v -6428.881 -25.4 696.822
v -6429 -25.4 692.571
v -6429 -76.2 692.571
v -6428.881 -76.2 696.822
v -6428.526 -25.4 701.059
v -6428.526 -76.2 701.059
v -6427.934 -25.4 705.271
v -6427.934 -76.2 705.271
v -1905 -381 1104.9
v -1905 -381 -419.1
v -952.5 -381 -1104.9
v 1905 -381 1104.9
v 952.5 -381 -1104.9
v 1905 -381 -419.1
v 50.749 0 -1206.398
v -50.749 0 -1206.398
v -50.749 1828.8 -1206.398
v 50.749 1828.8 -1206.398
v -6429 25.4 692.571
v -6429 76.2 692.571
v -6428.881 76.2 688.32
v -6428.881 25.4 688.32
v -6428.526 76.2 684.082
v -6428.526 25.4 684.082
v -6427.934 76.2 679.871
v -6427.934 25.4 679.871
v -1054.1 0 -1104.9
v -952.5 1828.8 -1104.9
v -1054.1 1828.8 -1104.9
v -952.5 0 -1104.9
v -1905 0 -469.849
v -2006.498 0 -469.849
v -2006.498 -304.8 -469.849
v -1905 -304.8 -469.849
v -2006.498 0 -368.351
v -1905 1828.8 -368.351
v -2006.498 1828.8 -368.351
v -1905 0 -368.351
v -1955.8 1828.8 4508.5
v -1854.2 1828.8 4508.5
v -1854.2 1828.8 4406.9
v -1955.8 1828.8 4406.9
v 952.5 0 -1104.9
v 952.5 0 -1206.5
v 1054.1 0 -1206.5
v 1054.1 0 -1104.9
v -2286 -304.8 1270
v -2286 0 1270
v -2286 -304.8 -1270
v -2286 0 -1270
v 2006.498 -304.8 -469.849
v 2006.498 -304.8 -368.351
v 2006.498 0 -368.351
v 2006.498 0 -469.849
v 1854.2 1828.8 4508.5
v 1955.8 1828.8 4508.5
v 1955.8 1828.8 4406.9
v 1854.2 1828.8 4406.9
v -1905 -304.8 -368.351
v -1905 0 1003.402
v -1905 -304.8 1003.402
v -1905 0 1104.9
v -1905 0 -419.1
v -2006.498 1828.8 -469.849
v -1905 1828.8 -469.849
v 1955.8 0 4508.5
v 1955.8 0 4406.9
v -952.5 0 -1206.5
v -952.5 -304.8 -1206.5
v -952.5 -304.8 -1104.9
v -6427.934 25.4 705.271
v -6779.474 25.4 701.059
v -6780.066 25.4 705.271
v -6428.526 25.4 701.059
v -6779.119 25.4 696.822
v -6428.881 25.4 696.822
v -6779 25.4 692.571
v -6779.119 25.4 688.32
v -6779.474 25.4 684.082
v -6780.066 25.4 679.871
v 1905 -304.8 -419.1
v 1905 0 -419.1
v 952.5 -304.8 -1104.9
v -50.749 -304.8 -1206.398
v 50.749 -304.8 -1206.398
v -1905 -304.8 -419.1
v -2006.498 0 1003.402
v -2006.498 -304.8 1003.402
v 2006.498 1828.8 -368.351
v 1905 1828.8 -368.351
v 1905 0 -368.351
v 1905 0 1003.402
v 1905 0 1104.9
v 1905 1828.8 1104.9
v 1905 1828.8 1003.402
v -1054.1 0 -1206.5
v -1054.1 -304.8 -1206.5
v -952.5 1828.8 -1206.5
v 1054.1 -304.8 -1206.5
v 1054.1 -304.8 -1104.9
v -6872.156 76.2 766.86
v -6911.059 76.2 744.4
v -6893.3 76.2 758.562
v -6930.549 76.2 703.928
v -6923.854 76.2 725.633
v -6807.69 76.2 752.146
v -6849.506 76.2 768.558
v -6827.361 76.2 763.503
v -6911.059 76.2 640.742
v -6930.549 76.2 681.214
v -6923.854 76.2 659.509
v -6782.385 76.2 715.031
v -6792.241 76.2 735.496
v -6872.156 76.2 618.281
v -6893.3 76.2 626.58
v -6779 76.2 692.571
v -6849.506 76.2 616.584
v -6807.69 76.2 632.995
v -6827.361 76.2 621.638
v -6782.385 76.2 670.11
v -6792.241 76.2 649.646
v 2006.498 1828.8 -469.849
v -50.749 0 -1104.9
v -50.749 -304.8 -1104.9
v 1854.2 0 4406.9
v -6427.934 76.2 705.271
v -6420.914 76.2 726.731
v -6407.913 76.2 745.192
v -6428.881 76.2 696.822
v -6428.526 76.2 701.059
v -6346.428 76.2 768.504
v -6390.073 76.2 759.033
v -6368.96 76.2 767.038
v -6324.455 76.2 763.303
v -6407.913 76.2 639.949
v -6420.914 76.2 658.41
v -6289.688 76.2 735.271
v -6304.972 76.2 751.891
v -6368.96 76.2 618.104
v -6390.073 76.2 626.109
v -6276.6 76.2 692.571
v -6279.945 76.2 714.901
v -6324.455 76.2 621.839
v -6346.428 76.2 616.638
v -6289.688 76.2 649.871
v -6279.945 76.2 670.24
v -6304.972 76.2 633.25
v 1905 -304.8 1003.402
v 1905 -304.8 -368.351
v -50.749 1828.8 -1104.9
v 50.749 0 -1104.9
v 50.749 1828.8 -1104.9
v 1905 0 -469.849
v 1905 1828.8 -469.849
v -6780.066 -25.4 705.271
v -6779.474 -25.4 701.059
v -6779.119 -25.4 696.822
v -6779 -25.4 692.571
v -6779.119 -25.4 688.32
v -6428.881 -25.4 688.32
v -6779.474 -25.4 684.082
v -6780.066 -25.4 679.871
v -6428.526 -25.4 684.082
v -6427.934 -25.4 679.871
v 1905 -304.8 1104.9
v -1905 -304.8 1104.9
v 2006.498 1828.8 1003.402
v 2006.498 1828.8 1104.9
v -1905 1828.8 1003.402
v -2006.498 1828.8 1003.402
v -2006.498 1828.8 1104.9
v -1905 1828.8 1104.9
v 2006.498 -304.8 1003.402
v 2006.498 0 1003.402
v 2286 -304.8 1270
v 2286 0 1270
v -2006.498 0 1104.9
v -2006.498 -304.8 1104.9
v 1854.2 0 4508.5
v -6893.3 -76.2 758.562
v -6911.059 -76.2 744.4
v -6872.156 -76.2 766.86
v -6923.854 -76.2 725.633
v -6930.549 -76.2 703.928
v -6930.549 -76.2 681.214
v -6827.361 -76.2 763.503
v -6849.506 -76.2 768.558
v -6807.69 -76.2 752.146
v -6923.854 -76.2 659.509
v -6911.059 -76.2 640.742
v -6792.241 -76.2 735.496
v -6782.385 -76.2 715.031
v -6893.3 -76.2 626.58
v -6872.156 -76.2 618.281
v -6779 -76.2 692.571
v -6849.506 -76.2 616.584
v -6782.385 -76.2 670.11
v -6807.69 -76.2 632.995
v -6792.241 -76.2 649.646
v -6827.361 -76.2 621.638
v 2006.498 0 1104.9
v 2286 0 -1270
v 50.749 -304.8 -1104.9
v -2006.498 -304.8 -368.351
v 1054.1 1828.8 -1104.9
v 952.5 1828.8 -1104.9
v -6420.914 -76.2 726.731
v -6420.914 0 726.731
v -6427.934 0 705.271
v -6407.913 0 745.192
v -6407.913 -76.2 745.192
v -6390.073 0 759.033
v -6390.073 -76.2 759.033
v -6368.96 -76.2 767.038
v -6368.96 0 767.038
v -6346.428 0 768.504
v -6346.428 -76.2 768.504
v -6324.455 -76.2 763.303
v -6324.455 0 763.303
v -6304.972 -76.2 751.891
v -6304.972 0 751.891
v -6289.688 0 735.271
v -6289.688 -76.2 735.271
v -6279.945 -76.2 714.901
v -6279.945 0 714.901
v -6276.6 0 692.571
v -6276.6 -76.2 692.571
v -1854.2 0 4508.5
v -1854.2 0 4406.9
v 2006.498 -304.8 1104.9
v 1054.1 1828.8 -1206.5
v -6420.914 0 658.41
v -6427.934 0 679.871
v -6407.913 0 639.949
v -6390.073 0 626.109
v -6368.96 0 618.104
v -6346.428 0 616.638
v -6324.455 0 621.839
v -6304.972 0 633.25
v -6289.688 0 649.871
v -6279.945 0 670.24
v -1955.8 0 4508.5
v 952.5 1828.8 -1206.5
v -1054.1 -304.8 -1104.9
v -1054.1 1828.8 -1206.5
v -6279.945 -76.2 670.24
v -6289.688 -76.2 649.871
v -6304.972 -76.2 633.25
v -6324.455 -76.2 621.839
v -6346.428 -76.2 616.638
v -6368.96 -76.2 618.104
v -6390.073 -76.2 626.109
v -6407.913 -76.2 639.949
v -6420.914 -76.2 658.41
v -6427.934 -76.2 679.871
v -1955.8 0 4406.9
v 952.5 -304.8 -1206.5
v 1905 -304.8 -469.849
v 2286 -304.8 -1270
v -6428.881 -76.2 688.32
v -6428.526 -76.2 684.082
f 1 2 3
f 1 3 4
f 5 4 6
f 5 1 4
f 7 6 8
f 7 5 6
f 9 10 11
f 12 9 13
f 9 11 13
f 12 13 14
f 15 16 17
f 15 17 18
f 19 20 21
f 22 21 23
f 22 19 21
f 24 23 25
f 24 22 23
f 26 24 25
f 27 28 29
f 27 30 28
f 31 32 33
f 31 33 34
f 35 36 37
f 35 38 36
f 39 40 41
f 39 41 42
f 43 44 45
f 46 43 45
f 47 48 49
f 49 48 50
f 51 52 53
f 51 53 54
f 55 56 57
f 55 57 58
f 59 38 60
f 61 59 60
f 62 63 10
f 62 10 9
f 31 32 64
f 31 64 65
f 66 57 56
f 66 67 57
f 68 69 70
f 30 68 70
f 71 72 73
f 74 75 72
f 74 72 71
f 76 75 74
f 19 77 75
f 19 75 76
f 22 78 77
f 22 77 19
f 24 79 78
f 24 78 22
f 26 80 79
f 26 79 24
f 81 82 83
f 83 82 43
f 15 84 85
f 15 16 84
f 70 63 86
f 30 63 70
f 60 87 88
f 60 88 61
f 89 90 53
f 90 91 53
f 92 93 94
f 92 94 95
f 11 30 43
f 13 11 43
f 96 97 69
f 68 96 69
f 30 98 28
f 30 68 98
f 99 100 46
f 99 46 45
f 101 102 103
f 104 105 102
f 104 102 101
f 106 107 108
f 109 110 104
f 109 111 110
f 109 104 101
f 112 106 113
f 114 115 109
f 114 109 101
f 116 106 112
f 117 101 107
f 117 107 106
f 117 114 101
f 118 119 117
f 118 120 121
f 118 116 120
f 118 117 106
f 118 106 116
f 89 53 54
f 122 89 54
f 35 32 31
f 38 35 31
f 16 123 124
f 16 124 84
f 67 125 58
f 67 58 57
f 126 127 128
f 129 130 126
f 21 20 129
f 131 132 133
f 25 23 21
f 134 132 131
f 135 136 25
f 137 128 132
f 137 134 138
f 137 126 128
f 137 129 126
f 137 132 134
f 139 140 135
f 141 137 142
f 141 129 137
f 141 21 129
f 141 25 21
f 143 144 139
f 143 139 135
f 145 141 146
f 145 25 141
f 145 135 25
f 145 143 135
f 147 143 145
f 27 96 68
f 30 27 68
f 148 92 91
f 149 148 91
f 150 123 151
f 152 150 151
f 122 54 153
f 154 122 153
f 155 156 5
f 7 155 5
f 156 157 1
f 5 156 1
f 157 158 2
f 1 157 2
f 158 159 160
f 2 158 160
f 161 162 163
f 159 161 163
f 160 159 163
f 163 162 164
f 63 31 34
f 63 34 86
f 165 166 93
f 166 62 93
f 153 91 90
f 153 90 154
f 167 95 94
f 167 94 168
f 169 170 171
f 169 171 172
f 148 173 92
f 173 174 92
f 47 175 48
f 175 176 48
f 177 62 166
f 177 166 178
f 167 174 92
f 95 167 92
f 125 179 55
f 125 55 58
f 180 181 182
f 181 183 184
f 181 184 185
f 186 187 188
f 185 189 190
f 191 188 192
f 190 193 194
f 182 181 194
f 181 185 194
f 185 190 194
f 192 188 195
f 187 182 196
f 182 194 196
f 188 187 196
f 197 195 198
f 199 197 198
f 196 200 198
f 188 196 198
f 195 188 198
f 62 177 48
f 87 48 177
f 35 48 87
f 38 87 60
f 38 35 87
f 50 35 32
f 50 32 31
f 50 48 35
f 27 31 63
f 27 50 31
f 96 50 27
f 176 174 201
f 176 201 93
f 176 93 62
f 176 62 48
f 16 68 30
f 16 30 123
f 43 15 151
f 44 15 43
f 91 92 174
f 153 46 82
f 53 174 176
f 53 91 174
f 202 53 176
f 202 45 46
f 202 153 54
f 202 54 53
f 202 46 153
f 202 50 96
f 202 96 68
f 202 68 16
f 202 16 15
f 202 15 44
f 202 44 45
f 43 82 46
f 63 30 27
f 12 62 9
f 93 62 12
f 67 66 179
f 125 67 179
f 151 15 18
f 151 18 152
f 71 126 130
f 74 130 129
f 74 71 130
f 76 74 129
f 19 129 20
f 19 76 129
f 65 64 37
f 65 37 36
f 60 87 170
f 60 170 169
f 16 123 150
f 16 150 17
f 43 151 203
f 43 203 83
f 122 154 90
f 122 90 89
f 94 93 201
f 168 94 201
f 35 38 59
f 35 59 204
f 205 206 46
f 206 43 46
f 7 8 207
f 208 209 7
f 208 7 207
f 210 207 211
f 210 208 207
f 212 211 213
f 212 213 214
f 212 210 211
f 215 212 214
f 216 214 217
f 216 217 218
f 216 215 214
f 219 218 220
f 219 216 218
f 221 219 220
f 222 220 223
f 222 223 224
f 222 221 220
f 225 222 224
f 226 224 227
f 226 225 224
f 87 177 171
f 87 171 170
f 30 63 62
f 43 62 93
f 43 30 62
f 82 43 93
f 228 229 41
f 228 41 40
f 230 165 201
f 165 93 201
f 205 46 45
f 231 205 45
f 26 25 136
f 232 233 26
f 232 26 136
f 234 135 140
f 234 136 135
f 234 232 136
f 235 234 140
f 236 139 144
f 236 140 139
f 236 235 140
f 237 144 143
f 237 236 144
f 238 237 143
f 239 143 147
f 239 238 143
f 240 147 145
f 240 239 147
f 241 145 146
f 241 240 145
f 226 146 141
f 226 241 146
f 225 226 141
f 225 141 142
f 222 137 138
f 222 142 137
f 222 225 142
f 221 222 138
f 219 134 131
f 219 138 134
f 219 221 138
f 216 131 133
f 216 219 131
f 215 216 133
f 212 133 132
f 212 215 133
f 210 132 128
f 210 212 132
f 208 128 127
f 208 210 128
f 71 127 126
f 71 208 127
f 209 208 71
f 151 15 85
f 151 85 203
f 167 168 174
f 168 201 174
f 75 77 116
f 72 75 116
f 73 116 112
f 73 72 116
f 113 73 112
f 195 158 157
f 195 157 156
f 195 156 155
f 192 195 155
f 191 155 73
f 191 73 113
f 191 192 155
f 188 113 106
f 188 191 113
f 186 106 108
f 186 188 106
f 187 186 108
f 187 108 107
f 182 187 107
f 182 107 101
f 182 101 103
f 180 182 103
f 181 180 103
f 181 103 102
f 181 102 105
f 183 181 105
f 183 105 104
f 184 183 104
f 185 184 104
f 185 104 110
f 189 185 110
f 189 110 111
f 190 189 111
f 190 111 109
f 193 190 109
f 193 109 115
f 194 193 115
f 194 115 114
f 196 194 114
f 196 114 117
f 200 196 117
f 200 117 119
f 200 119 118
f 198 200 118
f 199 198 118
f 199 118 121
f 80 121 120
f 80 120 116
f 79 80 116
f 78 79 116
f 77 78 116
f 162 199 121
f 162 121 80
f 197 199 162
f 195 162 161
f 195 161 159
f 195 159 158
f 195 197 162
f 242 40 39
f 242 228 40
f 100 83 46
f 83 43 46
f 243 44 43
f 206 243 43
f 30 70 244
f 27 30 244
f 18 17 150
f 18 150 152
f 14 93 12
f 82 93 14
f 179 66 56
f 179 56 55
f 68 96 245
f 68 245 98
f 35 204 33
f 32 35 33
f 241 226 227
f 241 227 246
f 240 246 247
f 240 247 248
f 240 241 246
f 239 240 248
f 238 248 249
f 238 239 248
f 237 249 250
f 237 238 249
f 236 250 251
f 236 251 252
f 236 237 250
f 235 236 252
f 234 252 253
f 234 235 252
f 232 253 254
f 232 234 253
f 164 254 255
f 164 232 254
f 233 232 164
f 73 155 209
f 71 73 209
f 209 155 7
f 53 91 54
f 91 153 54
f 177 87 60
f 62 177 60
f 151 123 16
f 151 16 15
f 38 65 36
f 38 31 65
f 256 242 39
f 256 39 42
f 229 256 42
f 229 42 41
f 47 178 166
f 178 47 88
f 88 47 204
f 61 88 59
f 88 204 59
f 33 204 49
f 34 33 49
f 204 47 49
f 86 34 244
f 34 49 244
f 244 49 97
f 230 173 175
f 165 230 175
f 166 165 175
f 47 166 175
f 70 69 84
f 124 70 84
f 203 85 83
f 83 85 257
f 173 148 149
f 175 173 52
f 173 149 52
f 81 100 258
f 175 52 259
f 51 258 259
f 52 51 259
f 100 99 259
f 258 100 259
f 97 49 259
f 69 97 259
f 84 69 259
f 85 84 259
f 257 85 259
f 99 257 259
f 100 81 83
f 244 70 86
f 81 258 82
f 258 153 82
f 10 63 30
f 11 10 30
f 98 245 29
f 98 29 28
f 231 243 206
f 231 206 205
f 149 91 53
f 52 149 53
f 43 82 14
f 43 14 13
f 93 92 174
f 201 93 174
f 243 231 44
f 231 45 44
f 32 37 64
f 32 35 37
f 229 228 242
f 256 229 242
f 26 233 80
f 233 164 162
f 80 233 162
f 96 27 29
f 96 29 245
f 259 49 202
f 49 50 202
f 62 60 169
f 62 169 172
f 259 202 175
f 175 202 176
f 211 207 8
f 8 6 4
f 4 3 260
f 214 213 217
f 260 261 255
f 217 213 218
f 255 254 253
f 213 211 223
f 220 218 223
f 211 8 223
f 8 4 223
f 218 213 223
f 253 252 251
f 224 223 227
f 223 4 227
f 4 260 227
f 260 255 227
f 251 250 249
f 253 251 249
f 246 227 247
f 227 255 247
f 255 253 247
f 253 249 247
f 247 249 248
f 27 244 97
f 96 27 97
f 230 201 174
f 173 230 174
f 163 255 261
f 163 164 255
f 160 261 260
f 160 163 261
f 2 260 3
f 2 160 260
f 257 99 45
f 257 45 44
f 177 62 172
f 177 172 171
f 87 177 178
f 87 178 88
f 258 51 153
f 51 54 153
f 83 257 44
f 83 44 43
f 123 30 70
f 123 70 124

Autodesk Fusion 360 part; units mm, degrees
sketch "Sketch1" plane through (0, 0, 0) normal (0, 1, 0) x (1, 0, 0)
  line L0 (0, 1104.9) -> (0, -342.9) construction
  line L1 (-1905, 1104.9) -> (1905, 1104.9) construction
  line L2 (-1905, -1104.9) -> (1905, -1104.9)
  line L3 (1905, -1104.9) -> (-1905, 1104.9) construction
  line L4 (-1905, -1104.9) -> (-1905, 1104.9) construction
  line L5 (0, -342.9) -> (0, 419.1) construction
  line L6 (0, 1104.9) -> (0, -342.9) construction
  line L7 (-1905, 419.1) -> (-952.5, 1104.9)
  line L8 (-1905, -342.9) -> (-1905, 1104.9) construction
  line L9 (-1905, 419.1) -> (-1905, -1104.9)
  line L10 (1905, 1104.9) -> (1905, -1104.9) construction
  line L11 (-1905, 1104.9) -> (0, 1104.9) construction
  line L12 (1905, -342.9) -> (1905, 1104.9) construction
  line L13 (1905, -342.9) -> (1905, 419.1) construction
  line L14 (0, -342.9) -> (1905, -342.9) construction
  line L15 (1905, 1104.9) -> (0, 1104.9) construction
  line L16 (1905, 419.1) -> (952.5, 1104.9) construction
  line L17 (-952.5, 1104.9) -> (952.5, 1104.9)
  line L18 (0, 1104.9) -> (0, -342.9) construction
  line L19 (1905, 419.1) -> (-1905, 419.1)
  line L20 (1905, -1104.9) -> (1905, 419.1)
  line L21 (-1905, -1104.9) -> (1905, 1104.9) construction
  line L22 (1905, -1104.9) -> (-1905, -1104.9) construction
  line L23 (0, -342.9) -> (-1905, -342.9) construction
  line L24 (1905, 419.1) -> (952.5, 1104.9)
  line L25 (1905, 419.1) -> (0, 419.1) construction
  line L26 (50.7492, 1206.3984) -> (50.7492, 1104.9)
  line L27 (952.5, 1104.9) -> (-952.5, 1104.9)
  line L28 (-1905, -1104.9) -> (1905, -1104.9)
  line L29 (-1905, -1104.9) -> (-2006.4984, -1104.9)
  line L30 (-2006.4984, 368.3508) -> (-2006.4984, 469.8492)
  line L31 (-1905, -1003.4016) -> (-1905, -1104.9)
  line L32 (952.5, 1104.9) -> (1054.1, 1104.9)
  line L33 (1054.1, 1206.5) -> (952.5, 1206.5)
  line L34 (1905, 419.1) -> (952.5, 1104.9)
  line L35 (0, 1104.9) -> (0, -1104.9) construction
  line L36 (1905, -1104.9) -> (2006.4984, -1104.9)
  line L37 (-1905, 368.3508) -> (-2006.4984, 469.8492) construction
  line L38 (-952.5, 1206.5) -> (-952.5, 1104.9)
  line L39 (50.7492, 1104.9) -> (-50.7492, 1206.3984) construction
  line L40 (-1905, 419.1) -> (-1955.7492, 419.1) construction
  line L41 (2006.4984, 368.3508) -> (1905, 469.8492) construction
  line L42 (0, 1104.9) -> (0, 1155.6492) construction
  line L43 (-1905, 419.1) -> (-1905, -1104.9)
  line L44 (-50.7492, 1104.9) -> (50.7492, 1206.3984) construction
  line L45 (-2006.4984, 469.8492) -> (-1905, 469.8492)
  line L46 (-50.7492, 1206.3984) -> (50.7492, 1206.3984)
  line L47 (-2006.4984, -1104.9) -> (-2006.4984, -1003.4016)
  line L48 (1905, -1003.4016) -> (1905, -1104.9)
  line L49 (-952.5, 1104.9) -> (-1905, 419.1)
  line L50 (-50.7492, 1104.9) -> (-50.7492, 1206.3984)
  line L51 (2006.4984, -1003.4016) -> (1905, -1003.4016)
  line L52 (-2006.4984, -1003.4016) -> (-1905, -1003.4016)
  line L53 (50.7492, 1104.9) -> (-50.7492, 1104.9)
  line L54 (1054.1, 1104.9) -> (1054.1, 1206.5)
  line L55 (-1905, 368.3508) -> (-2006.4984, 368.3508)
  line L56 (-1054.1, 1206.5) -> (-952.5, 1206.5)
  line L57 (2006.4984, -1104.9) -> (2006.4984, -1003.4016)
  line L58 (1905, 368.3508) -> (2006.4984, 469.8492) construction
  line L59 (-1054.1, 1104.9) -> (-1054.1, 1206.5)
  line L60 (1905, 419.1) -> (1955.7492, 419.1) construction
  line L61 (-1905, 469.8492) -> (-1905, 368.3508)
  line L62 (2006.4984, 469.8492) -> (1905, 469.8492)
  line L63 (1905, 469.8492) -> (1905, 368.3508)
  line L64 (-2006.4984, 368.3508) -> (-1905, 469.8492) construction
  line L65 (1905, 368.3508) -> (2006.4984, 368.3508)
  line L66 (-952.5, 1104.9) -> (-1054.1, 1104.9)
  line L67 (2006.4984, 368.3508) -> (2006.4984, 469.8492)
  line L68 (952.5, 1206.5) -> (952.5, 1104.9)
  line L69 (1905, -1104.9) -> (1905, 419.1)
  line L70 (2286, -1270) -> (-2286, -1270)
  line L71 (-2286, -1270) -> (-2286, 1270)
  line L72 (-2286, 1270) -> (2286, 1270)
  line L73 (2286, 1270) -> (2286, -1270)
  line L74 (2286, -1270) -> (-2286, 1270) construction
  line L75 (-2286, -1270) -> (2286, 1270) construction
  point P0 (-1955.7492, 419.1)
  point P1 (0, 1155.6492)
  point P2 (952.5, 1104.9)
  point P3 (1905, 419.1)
  point P4 (1905, -1104.9)
  point P5 (1955.7492, 419.1)
  dimension "d1" = 3810
  dimension "d2" = 2209.8
  dimension "d3" = 1447.8
  dimension "d4" = 762
  dimension "d5" = 762
  dimension "d8" = 101.6
  dimension "d9" = 101.6
  dimension "d10" = 50.7492
  dimension "d11" = 101.4984
  dimension "d12" = 101.4984
  dimension "d13" = 50.7492
  dimension "d14" = 101.4984
  dimension "d15" = 101.4984
  dimension "d16" = 101.4984
  dimension "d17" = 101.4984
extrude "Extrude1" add sketch "Sketch1" along normal blind 1828.8 contours L9 L29 L31 L43 L47 L52 | L38 L56 L59 L66 | L32 L33 L54 L68 | L20 L36 L48 L51 L57 L69 | L9 L30 L43 L45 L55 L61 | L20 L62 L63 L65 L67 L69 | L17 L26 L27 L46 L50 L53 makes body 1 at (952.5, 609.6, -1172.6333) makes body 2 at (-986.3667, 609.6, -1104.9) makes body 3 at (-50.7492, 609.6, -1138.7328) makes body 4 at (1972.6656, 609.6, -469.8492) makes body 5 at (-1938.8328, 609.6, -368.3508) makes body 6 at (-1938.8328, 609.6, 1104.9) makes body 7 at (1905, 1219.2, 1071.0672)
extrude "Extrude2" add sketch "Sketch1" against normal blind 304.8 separate body makes body 8
extrude "Extrude3" add sketch "Sketch1" against normal blind 381 separate body contours L2 L9 L19 L20 L28 L31 L43 L48 L61 L63 L69 | L7 L17 L19 L24 L27 L34 L49 L53 makes body 9
ref_plane "WorkPlane1" through (0, 1828.8, 0) normal (0, 1, 0) x (0, 0, 1)
sketch "Sketch3" plane through (0, 1828.8, 0) normal (0, 1, 0) x (1, 0, 0)
  line L0 (-1905, 419.1) -> (-1905, -1104.9) construction
  line L1 (0, 1104.9) -> (0, -1104.9) construction
  line L2 (1905, -1104.9) -> (1905, 419.1) construction
  line L3 (952.5, 1104.9) -> (-952.5, 1104.9) construction
  line L4 (-1115.3442, 97.5223) -> (-1828.8, -4457.6999)
  line L5 (-1905, -1104.9) -> (1905, -1104.9) construction
  line L6 (831.349, -64.1091) -> (1469.5957, -4515.3092)
  line L7 (1905, 419.1) -> (952.5, 1104.9) construction
  line L8 (-952.5, 1104.9) -> (-1905, 419.1) construction
  line L9 (50.7492, 1104.9) -> (50.7492, 1206.3984)
  line L10 (50.7492, 1206.3984) -> (-50.7492, 1206.3984)
  line L11 (-50.7492, 1206.3984) -> (-50.7492, 1104.9)
  line L12 (-50.7492, 1104.9) -> (50.7492, 1104.9)
  line L13 (-1905, 469.8492) -> (-2006.4984, 469.8492)
  line L14 (-2006.4984, 469.8492) -> (-2006.4984, 368.3508)
  line L15 (-2006.4984, 368.3508) -> (-1905, 368.3508)
  line L16 (-1905, 368.3508) -> (-1905, 469.8492)
  line L17 (1905, 368.3508) -> (2006.4984, 368.3508)
  line L18 (2006.4984, 368.3508) -> (2006.4984, 469.8492)
  line L19 (2006.4984, 469.8492) -> (1905, 469.8492)
  line L20 (1905, 469.8492) -> (1905, 368.3508)
  line L21 (831.349, -64.1091) -> (820.5335, 11.3194) construction
  circle A0 centre (825.9413, -26.3949) radius 38.1
  line L22 (-1115.3442, 97.5223) -> (-1115.3442, 173.7223) construction
  circle A1 centre (-1115.3442, 135.6223) radius 38.1
  line L23 (-1153.3891, 137.6712) -> (-1905, 368.3508)
  line L24 (-1115.3442, 173.7223) -> (-50.7492, 1104.9)
  line L25 (812.5209, 9.2633) -> (50.7492, 1104.9)
  line L26 (788.4457, -33.1542) -> (1905, 368.3508)
  point P0 (0, 419.1)
  dimension "d37" = 76.2
  dimension "d38" = 76.2
ref_plane "WorkPlane3" through (0, 1524, 0) normal (0, 1, 0) x (0, 0, 1)
sketch "Sketch4" plane through (0, 1524, 0) normal (0, 1, 0) x (1, 0, 0)
  line L0 (0, 1143) -> (0, -1778) construction
  line L1 (0, -1778) -> (0, 0) construction
  line L2 (175, -876.3) -> (-175, -876.3)
  line L3 (-175, -876.3) -> (-175, -901.7)
  line L4 (-175, -901.7) -> (175, -901.7)
  line L5 (175, -901.7) -> (175, -876.3)
  line L6 (175, -876.3) -> (-175, -901.7) construction
  line L7 (-175, -876.3) -> (175, -901.7) construction
  line L8 (-175, -889) -> (-251.2, -889) construction
  line L9 (175, -889) -> (251.2, -889) construction
  circle A0 centre (251.2, -889) radius 76.2
  circle A1 centre (-251.2, -889) radius 76.2
  line L10 (-1828.8, -4457.6999) -> (-256.5809, -965.0098)
  line L11 (-952.5, 1104.9) -> (-952.5, 1206.5)
  line L12 (-952.5, 1206.5) -> (-1054.1, 1206.5)
  line L13 (-1054.1, 1206.5) -> (-1054.1, 1104.9)
  line L14 (-1054.1, 1104.9) -> (-952.5, 1104.9)
  line L15 (952.5, 1206.5) -> (952.5, 1104.9)
  line L16 (952.5, 1104.9) -> (1054.1, 1104.9)
  line L17 (1054.1, 1104.9) -> (1054.1, 1206.5)
  line L18 (1054.1, 1206.5) -> (952.5, 1206.5)
  line L19 (-256.5809, -965.0098) -> (-256.5809, -812.9902) construction
  line L20 (255.2053, -965.0946) -> (255.2053, -812.9053) construction
  line L21 (-952.5, 1104.9) -> (-256.5809, -812.9902)
  line L22 (952.5, 1104.9) -> (255.2053, -812.9053)
  line L23 (255.2053, -965.0946) -> (1469.5957, -4515.3092)
  line L24 (-175, -901.7) -> (-176.0658, -901.7)
  line L25 (-175, -876.3) -> (-176.0658, -876.3)
  line L26 (175, -876.3) -> (176.0658, -876.3)
  line L27 (175, -901.7) -> (176.0658, -901.7)
  point P0 (0, -889)
  point P1 (-1828.8, -4457.6999)
  point P2 (1469.5957, -4515.3092)
  dimension "d27" = 350
  dimension "d28" = 25.4
  dimension "d29" = 76.2
  dimension "d30" = 76.2
sketch "Sketch5" plane through (0, 0, 0) normal (0, 1, 0) x (-1, 0, 0)
  line L0 (-1054.1, -1104.9) -> (-952.5, -1104.9)
  line L1 (-952.5, -1104.9) -> (-1905, -419.1)
  line L2 (-1905, -419.1) -> (-1905, -469.8492)
  line L3 (-1905, -469.8492) -> (-2006.4984, -469.8492)
  line L4 (-2006.4984, -469.8492) -> (-2006.4984, -368.3508)
  line L5 (-2006.4984, -368.3508) -> (-1905, -368.3508)
  line L6 (-1905, -368.3508) -> (-1905, 1003.4016)
  line L7 (-1905, 1003.4016) -> (-2006.4984, 1003.4016)
  line L8 (-2006.4984, 1003.4016) -> (-2006.4984, 1104.9)
  line L9 (-2006.4984, 1104.9) -> (2006.4984, 1104.9)
  line L10 (2006.4984, 1104.9) -> (2006.4984, 1003.4016)
  line L11 (2006.4984, 1003.4016) -> (1905, 1003.4016)
  line L12 (1905, 1003.4016) -> (1905, -368.3508)
  line L13 (1905, -368.3508) -> (2006.4984, -368.3508)
  line L14 (2006.4984, -368.3508) -> (2006.4984, -469.8492)
  line L15 (2006.4984, -469.8492) -> (1905, -469.8492)
  line L16 (1905, -469.8492) -> (1905, -419.1)
  line L17 (1905, -419.1) -> (952.5, -1104.9)
  line L18 (952.5, -1104.9) -> (1054.1, -1104.9)
  line L19 (1054.1, -1104.9) -> (1054.1, -1206.5)
  line L20 (1054.1, -1206.5) -> (952.5, -1206.5)
  line L21 (952.5, -1206.5) -> (952.5, -1104.9)
  line L22 (952.5, -1104.9) -> (50.7492, -1104.9)
  line L23 (50.7492, -1104.9) -> (50.7492, -1206.3984)
  line L24 (50.7492, -1206.3984) -> (-50.7492, -1206.3984)
  line L25 (-50.7492, -1206.3984) -> (-50.7492, -1104.9)
  line L26 (-50.7492, -1104.9) -> (-952.5, -1104.9)
  line L27 (-952.5, -1104.9) -> (-952.5, -1206.5)
  line L28 (-952.5, -1206.5) -> (-1054.1, -1206.5)
  line L29 (-1054.1, -1206.5) -> (-1054.1, -1104.9)
  line L30 (-2286, -1270) -> (2286, -1270)
  line L31 (2286, -1270) -> (2286, 1270)
  line L32 (2286, 1270) -> (-2286, 1270)
  line L33 (-2286, 1270) -> (-2286, -1270)
  line L34 (1905, 1104.9) -> (1905, 4457.6999) construction
  line L35 (-1905, 1104.9) -> (-1905, 4457.6999) construction
  line L36 (-1905, 4457.6999) -> (1905, 4457.6999) construction
  line L37 (1854.2, 4508.4999) -> (1955.8, 4508.4999)
  line L38 (1955.8, 4508.4999) -> (1955.8, 4406.8999)
  line L39 (1955.8, 4406.8999) -> (1854.2, 4406.8999)
  line L40 (1854.2, 4406.8999) -> (1854.2, 4508.4999)
  line L41 (1854.2, 4508.4999) -> (1955.8, 4406.8999) construction
  line L42 (1955.8, 4508.4999) -> (1854.2, 4406.8999) construction
  line L43 (-1955.8, 4508.4999) -> (-1854.2, 4508.4999)
  line L44 (-1854.2, 4508.4999) -> (-1854.2, 4406.8999)
  line L45 (-1854.2, 4406.8999) -> (-1955.8, 4406.8999)
  line L46 (-1955.8, 4406.8999) -> (-1955.8, 4508.4999)
  line L47 (-1955.8, 4508.4999) -> (-1854.2, 4406.8999) construction
  line L48 (-1854.2, 4508.4999) -> (-1955.8, 4406.8999) construction
  point P0 (1828.8, 4457.6999)
  point P1 (-1469.5957, 4515.3092)
  point P2 (1905, 4457.6999)
  point P3 (-1905, 4457.6999)
  dimension "d31" = 101.6
  dimension "d32" = 101.6
  dimension "d33" = 101.6
  dimension "d34" = 101.6
extrude "Extrude4" add sketch "Sketch5" along normal blind 1828.8 separate body contours L37 L38 L39 L40 | L43 L44 L45 L46 makes body 10 at (-1888.0667, 609.6, 4508.4999) makes body 11 at (1921.9333, 609.6, 4508.4999)
sketch "Sketch6" plane through (0, 0, 0) normal (0, 1, 0) x (1, 0, 0)
  line L0 (-6779, -705.2707) -> (-6780.0658, -705.2707)
  line L1 (-6429, -679.8707) -> (-6427.9342, -679.8707)
  line L2 (-6779, -679.8707) -> (-6429, -705.2707) construction
  circle A0 centre (-6855.2, -692.5707) radius 76.2
  line L3 (-6779, -705.2707) -> (-6429, -705.2707)
  line L4 (-6855.2, -768.7707) -> (-6855.2, -616.3707) construction
  circle A1 centre (-6352.8, -692.5707) radius 76.2
  line L5 (-6779, -679.8707) -> (-6780.0658, -679.8707)
  line L6 (-6429, -705.2707) -> (-6427.9342, -705.2707)
  line L7 (-6429, -705.2707) -> (-6429, -679.8707)
  line L8 (-6352.8, -768.7707) -> (-6352.8, -616.3707) construction
  line L9 (-6779, -692.5707) -> (-6855.2, -692.5707) construction
  line L10 (-6429, -679.8707) -> (-6779, -679.8707)
  line L11 (-6429, -692.5707) -> (-6352.8, -692.5707) construction
  line L12 (-6779, -679.8707) -> (-6779, -705.2707)
  line L13 (-6429, -679.8707) -> (-6779, -705.2707) construction
  point P0 (-6604, -692.5707)
  dimension "d39" = 350
  dimension "d40" = 25.4
  dimension "d41" = 76.2
  dimension "d42" = 76.2
extrude "Extrude5" add sketch "Sketch6" along normal mid plane 152.4 separate body contours A0 | A1 makes body 12 at (-6868.432, -25.4, 767.6131) makes body 13 at (-6331.4073, 76.2, 674.1041)
extrude "Extrude6" add sketch "Sketch6" along normal mid plane 50.8 contours L3 L7 L10 L12 | L0 A0 L12 | A1 L6 L7 | A0 L5 L12 | L1 A1 L7 bodies 12 13
